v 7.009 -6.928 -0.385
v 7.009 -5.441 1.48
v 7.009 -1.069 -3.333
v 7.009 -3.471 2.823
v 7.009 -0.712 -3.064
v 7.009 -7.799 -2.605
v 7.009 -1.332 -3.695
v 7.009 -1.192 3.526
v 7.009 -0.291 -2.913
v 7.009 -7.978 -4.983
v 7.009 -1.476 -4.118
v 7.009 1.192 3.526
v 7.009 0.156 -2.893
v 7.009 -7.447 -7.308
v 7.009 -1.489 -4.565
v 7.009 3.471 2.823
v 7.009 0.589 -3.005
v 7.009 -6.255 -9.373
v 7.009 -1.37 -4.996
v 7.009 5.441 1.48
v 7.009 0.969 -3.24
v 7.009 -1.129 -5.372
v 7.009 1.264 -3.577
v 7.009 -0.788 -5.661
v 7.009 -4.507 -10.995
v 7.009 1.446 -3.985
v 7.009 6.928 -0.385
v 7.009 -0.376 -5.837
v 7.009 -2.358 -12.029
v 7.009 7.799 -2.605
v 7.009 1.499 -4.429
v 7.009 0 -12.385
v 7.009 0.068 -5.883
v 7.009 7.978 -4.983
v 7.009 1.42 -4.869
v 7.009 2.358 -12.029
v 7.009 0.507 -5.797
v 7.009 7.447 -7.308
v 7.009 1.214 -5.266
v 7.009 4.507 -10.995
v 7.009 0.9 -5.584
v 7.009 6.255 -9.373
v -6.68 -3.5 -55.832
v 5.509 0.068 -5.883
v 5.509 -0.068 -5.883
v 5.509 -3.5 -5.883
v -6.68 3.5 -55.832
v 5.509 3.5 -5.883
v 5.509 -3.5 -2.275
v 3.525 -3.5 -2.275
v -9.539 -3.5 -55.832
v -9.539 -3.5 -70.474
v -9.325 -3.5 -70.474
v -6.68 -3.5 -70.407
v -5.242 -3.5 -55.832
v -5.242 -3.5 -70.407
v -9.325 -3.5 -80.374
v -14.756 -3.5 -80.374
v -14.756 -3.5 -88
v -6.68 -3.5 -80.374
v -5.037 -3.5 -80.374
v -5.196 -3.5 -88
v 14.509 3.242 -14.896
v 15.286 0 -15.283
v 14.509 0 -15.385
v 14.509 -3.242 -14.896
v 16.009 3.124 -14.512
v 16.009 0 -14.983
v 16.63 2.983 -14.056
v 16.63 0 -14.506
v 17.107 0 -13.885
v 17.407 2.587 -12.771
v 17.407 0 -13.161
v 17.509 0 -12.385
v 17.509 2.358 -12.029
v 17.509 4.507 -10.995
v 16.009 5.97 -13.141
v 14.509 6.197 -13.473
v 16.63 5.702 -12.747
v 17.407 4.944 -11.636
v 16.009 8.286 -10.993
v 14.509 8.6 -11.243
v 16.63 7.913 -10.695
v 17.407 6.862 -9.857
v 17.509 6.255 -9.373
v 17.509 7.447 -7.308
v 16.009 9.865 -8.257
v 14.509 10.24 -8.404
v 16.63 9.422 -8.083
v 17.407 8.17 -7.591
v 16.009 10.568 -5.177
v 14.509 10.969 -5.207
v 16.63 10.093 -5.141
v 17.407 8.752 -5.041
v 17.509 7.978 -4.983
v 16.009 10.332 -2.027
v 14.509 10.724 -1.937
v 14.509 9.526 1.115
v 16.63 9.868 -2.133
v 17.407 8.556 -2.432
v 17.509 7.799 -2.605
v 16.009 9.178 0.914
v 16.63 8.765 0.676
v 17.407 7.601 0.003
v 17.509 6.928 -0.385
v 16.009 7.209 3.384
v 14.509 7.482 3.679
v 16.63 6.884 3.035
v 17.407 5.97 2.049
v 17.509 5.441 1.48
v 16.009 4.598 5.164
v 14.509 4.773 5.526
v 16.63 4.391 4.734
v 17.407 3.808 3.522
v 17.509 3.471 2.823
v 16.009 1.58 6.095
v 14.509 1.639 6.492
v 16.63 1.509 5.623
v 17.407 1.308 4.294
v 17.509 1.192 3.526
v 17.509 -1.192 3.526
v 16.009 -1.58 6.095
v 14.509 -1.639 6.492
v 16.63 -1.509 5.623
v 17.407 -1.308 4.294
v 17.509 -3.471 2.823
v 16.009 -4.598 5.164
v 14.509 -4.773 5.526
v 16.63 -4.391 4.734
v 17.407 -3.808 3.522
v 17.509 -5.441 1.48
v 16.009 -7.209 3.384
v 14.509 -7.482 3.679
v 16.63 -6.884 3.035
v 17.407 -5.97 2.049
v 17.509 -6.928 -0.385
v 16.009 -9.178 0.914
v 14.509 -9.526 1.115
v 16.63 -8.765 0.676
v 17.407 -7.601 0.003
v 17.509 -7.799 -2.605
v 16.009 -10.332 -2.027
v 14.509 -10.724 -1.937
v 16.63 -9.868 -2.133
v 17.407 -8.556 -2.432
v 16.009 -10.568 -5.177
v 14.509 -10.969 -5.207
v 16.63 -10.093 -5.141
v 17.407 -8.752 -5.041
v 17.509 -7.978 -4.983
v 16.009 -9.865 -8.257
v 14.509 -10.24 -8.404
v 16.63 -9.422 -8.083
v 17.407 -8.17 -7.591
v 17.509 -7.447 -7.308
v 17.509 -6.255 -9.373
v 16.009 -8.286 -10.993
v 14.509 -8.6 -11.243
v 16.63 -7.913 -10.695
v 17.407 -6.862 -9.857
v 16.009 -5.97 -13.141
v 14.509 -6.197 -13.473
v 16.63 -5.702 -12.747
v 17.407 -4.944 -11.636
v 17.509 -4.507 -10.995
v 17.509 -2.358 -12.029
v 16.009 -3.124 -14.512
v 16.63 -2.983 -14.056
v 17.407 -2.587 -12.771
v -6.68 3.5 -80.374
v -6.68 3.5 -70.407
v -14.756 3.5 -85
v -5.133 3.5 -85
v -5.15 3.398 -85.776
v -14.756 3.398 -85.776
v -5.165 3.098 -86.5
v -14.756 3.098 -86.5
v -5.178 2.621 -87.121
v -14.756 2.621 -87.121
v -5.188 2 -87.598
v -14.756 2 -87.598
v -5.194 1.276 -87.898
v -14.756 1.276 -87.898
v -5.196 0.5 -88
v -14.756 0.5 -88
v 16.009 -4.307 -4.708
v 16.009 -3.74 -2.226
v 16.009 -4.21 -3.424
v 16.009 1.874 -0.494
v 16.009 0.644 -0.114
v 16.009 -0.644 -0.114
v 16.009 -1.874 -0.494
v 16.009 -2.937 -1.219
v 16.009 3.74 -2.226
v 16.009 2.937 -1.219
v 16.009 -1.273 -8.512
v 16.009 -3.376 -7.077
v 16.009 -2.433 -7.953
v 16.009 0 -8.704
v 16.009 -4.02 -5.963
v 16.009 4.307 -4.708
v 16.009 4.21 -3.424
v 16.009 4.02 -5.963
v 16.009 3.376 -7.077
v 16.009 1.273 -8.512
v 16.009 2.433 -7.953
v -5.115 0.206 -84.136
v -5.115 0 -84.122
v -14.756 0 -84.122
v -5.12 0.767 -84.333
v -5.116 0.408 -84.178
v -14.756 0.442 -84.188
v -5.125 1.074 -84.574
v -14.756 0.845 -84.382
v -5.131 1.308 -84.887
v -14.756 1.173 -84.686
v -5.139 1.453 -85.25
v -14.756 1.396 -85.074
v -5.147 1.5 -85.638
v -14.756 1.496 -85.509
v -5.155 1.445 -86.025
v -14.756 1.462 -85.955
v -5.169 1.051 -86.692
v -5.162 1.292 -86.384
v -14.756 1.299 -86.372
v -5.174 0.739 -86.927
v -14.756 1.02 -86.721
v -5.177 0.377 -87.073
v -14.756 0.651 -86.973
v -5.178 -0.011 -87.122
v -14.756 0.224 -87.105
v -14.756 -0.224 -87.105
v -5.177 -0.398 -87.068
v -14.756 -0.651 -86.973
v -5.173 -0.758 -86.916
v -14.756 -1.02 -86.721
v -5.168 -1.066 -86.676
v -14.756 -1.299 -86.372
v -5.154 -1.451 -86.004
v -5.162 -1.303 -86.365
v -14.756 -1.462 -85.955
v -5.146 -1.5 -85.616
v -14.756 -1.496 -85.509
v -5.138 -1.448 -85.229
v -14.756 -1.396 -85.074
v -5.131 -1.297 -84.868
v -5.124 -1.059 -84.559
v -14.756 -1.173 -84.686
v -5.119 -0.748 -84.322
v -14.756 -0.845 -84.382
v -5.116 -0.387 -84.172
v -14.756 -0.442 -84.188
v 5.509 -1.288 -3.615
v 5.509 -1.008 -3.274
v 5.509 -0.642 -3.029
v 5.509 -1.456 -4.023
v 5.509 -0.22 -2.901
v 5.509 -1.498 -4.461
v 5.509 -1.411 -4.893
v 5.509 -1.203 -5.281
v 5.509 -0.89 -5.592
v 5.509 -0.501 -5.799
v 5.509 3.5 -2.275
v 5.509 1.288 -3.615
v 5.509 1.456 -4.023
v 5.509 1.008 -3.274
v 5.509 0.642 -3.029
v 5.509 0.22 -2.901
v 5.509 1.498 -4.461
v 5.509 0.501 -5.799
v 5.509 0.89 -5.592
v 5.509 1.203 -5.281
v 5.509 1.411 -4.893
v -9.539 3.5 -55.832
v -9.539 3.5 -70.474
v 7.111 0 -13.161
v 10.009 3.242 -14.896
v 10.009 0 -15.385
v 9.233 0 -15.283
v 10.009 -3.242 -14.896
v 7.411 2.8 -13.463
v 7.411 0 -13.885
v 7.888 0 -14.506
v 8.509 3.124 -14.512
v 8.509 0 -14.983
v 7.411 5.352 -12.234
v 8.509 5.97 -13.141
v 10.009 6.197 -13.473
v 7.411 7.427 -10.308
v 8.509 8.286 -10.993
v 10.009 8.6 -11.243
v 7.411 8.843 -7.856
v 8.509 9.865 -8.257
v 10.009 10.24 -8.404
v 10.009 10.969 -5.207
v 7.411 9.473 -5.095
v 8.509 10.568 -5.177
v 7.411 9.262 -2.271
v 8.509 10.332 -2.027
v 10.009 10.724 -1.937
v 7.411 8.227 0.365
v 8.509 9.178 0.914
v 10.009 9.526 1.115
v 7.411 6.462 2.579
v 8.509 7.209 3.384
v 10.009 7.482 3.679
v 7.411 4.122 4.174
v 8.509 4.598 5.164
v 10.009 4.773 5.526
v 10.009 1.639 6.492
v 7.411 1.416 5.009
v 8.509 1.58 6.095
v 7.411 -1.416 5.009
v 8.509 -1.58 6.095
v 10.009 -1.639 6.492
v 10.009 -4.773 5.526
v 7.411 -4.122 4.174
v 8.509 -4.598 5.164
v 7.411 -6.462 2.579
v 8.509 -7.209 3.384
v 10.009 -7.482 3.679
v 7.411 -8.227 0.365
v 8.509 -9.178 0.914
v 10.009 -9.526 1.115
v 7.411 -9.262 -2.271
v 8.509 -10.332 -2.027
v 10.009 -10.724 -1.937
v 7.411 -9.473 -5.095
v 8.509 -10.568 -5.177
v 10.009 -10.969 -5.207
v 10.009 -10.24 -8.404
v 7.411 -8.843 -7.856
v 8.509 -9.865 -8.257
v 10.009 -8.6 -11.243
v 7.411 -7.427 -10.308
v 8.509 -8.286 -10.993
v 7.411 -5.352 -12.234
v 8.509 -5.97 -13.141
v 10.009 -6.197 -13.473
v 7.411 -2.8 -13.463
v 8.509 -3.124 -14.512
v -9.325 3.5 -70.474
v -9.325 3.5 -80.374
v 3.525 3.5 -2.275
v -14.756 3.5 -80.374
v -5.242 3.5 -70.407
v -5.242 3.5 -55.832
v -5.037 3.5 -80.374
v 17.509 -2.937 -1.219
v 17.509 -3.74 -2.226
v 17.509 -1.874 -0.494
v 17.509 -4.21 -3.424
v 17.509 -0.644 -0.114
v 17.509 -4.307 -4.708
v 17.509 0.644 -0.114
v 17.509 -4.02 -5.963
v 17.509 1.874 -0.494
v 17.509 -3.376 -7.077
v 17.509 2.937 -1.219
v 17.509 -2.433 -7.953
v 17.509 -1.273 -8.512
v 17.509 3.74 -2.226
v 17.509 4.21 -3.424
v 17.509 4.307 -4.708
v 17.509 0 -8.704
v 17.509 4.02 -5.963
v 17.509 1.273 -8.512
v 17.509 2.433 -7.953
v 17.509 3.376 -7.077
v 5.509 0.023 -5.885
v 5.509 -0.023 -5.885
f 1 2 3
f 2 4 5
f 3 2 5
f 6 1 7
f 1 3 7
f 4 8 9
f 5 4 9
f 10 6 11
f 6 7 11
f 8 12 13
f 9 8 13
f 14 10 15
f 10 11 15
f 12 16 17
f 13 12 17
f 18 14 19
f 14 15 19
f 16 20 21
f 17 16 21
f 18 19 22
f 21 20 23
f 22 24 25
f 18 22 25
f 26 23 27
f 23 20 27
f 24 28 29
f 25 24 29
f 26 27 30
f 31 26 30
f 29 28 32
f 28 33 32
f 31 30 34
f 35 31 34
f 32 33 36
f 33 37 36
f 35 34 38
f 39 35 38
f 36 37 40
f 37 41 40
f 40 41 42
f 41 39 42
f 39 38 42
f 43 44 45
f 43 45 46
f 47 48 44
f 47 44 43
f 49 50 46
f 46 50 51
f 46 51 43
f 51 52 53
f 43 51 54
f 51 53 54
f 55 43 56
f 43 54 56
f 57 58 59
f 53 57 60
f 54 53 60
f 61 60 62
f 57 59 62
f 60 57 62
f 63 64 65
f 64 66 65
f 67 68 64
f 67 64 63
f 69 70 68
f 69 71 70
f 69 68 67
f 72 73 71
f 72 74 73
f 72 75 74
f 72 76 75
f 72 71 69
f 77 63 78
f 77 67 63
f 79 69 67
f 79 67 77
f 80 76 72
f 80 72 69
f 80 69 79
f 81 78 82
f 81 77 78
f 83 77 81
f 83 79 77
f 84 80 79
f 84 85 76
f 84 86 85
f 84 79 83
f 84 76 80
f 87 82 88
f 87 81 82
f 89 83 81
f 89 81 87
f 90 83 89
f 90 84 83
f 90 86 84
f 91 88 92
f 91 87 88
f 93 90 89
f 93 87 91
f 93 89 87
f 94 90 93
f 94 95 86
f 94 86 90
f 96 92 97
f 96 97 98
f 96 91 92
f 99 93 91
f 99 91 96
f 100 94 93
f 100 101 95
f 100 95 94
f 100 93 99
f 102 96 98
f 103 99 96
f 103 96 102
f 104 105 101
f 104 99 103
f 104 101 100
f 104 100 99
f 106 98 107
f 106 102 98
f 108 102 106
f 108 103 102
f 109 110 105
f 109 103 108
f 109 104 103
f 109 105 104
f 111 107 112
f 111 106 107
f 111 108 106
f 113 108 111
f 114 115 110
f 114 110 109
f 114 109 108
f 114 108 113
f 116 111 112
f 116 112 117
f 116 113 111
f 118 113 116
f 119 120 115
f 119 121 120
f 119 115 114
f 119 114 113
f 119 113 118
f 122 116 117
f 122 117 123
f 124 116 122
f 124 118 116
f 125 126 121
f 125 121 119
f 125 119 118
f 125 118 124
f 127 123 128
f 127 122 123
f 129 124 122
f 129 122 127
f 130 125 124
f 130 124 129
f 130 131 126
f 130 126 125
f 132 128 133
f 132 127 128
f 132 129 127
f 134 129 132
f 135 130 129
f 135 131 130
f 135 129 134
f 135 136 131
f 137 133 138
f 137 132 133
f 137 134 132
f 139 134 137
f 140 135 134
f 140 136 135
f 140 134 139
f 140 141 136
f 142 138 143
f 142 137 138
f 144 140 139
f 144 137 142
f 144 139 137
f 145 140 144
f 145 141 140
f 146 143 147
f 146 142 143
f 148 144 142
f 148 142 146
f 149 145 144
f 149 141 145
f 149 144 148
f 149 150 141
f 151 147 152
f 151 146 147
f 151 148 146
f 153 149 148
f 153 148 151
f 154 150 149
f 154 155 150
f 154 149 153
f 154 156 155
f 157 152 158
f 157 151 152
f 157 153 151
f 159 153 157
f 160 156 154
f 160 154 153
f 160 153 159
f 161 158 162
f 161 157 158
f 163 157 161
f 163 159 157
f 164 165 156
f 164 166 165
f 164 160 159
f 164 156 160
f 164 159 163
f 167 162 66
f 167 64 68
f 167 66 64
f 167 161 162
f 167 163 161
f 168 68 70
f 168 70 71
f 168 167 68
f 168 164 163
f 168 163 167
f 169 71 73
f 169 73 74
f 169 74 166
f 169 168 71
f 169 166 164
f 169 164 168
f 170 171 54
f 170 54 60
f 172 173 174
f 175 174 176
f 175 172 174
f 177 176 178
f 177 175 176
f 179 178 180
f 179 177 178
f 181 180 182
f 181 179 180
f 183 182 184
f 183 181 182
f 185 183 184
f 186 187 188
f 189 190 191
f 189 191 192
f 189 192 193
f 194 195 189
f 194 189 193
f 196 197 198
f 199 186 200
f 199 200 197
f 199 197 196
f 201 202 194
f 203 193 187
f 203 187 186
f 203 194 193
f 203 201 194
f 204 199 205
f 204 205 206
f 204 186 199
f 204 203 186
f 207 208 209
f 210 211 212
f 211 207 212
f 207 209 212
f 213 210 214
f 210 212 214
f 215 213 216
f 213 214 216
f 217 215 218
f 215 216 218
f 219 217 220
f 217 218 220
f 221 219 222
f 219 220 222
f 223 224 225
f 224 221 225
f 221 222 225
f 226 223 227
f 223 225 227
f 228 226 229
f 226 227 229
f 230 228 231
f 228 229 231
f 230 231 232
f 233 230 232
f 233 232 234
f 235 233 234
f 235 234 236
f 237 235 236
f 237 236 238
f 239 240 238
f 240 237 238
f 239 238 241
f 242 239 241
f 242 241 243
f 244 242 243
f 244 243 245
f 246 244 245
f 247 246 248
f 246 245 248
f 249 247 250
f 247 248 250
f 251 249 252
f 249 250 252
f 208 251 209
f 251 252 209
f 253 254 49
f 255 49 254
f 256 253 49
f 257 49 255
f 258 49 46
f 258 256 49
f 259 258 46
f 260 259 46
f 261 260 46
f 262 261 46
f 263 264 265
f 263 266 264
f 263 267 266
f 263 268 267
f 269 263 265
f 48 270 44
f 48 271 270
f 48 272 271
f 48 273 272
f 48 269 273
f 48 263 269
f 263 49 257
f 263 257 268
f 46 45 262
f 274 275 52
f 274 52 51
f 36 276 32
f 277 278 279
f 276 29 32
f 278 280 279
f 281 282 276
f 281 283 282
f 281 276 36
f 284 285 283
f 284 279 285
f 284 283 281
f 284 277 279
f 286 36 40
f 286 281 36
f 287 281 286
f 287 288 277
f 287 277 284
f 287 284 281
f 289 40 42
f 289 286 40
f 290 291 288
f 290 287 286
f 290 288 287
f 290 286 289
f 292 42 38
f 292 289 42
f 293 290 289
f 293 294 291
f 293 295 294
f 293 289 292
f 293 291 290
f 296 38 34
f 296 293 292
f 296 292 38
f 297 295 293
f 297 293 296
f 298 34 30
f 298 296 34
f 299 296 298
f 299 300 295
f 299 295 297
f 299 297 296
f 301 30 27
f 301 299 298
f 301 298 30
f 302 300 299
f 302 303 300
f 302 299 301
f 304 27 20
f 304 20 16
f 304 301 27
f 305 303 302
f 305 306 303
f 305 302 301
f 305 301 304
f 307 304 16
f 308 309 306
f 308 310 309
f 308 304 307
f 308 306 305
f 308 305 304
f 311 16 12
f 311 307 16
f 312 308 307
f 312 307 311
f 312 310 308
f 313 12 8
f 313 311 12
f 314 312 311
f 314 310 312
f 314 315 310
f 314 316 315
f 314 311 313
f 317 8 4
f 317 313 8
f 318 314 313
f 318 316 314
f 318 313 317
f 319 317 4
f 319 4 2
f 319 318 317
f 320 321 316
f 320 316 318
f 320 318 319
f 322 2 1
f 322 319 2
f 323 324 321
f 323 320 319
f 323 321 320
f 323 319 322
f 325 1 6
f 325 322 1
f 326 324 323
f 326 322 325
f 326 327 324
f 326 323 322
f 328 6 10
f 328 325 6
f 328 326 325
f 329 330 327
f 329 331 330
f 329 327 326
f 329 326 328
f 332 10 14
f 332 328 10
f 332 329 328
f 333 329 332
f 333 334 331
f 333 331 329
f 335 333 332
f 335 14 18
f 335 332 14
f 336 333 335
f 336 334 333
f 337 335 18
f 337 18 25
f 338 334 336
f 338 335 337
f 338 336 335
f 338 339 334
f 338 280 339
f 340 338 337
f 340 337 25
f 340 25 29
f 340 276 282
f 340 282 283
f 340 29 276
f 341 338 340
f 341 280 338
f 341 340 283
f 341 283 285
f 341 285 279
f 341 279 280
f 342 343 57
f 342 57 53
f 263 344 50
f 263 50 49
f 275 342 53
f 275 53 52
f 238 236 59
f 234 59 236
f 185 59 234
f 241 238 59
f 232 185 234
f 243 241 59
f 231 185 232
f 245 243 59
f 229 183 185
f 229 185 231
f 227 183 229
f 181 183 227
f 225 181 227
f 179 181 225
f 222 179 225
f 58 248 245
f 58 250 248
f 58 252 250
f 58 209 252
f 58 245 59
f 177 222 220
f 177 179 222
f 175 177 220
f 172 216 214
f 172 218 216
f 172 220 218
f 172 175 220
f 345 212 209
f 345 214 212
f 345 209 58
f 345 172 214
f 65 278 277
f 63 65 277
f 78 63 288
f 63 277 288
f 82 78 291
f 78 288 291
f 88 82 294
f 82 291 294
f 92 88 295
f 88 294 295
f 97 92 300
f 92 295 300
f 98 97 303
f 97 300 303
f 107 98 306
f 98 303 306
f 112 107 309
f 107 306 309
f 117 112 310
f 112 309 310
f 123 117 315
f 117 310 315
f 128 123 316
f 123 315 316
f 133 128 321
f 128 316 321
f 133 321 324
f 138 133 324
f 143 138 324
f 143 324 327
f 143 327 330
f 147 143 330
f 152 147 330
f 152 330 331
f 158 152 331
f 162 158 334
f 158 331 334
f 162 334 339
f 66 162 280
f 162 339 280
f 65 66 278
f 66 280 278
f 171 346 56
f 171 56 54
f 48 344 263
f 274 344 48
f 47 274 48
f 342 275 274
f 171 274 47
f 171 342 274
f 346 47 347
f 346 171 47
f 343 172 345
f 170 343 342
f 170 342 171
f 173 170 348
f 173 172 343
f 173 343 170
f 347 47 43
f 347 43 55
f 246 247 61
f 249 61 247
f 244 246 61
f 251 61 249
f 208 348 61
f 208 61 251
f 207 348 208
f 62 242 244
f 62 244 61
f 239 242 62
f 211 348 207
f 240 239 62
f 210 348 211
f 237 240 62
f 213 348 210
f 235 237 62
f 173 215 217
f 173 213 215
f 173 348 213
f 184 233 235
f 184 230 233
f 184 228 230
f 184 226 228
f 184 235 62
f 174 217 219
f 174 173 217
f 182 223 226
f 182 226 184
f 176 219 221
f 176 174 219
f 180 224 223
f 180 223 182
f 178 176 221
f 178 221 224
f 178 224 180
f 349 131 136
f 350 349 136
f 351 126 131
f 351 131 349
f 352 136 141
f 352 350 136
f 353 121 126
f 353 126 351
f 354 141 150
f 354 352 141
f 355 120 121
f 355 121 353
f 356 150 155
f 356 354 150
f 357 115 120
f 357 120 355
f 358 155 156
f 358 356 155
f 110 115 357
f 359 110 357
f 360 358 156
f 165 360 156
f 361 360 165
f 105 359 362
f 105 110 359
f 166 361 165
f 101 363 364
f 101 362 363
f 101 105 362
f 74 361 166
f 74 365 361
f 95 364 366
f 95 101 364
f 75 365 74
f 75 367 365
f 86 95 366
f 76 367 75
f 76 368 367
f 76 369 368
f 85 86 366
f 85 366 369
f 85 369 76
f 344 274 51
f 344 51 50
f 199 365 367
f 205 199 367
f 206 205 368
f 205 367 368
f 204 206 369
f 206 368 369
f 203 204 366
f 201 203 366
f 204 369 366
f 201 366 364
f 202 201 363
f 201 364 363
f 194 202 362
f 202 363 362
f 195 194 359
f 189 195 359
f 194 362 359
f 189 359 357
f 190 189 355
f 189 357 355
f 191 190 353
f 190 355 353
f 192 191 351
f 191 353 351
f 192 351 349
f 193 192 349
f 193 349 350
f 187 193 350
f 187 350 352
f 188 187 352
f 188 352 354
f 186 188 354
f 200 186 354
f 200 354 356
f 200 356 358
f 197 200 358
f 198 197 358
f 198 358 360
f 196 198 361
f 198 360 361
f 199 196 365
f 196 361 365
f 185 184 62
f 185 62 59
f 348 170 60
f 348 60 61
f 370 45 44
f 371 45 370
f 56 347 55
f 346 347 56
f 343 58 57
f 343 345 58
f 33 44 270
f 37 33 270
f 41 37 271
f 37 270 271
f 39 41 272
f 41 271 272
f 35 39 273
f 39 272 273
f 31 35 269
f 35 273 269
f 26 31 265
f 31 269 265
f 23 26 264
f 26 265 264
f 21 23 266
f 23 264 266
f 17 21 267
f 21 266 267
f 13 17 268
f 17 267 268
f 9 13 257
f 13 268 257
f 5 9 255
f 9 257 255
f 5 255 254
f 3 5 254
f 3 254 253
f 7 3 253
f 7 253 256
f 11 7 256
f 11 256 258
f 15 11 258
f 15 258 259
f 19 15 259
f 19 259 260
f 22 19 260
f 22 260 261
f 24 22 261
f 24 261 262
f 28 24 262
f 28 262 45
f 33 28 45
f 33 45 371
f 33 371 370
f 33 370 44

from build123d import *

# Parameters (mm, degrees)
BOSS_EXTRUDE1_DEPTH = 3.5
SKETCH2_R           = 1.5
CUT_EXTRUDE1_DEPTH  = 27
SKETCH8_R           = 1.5
BOSS_EXTRUDE6_DEPTH = 1.5
SKETCH9_R           = 11
BOSS_EXTRUDE7_DEPTH = 10.5
FILLET11_R          = 3
FILLET12_R          = 3
SKETCH12_R          = 4.31867217
CUT_EXTRUDE2_DEPTH  = 1.5


with BuildPart() as part:
    # Sketch1 → Boss-Extrude1 (new, symmetric)
    with BuildSketch(Plane(origin=(0, 0, 0), x_dir=(1, 0, 0), z_dir=(0, 1, 0))):
        Polygon((-14.755737993, 80.374354469), (-9.325152651, 80.374354469), (-9.325152651, 70.474186712), (-9.539422483, 70.474186712), (-9.539422483, 55.832207765), (3.525320524, 2.274676859), (5.509138823, 2.274676859), (5.509138823, 5.883287993), (-6.679961691, 55.832207765), (-5.241843463, 55.832207765), (-5.241843463, 70.40730195), (-6.679961691, 70.40730195), (-6.679961691, 72.014475303), (-6.679961691, 80.374354469), (-5.036944489, 80.374354469), (-5.196098726, 88), (-14.755737993, 88), align=None)
    extrude(amount=BOSS_EXTRUDE1_DEPTH, both=True)

    # Sketch2 → Cut-Extrude1 (cut)
    with BuildSketch(Plane.ZY.offset(14.755737993)):
        with Locations((-85.621539819, 0)):
            Circle(SKETCH2_R)
    extrude(amount=-CUT_EXTRUDE1_DEPTH, mode=Mode.SUBTRACT)

    # Sketch8 → Boss-Extrude6 (add)
    with BuildSketch(Plane(origin=(5.509138823, 0, 0), x_dir=(0, 0, -1), z_dir=(1, 0, 0))):
        with Locations(Location((4.384839861, 0, 0), (0, 0, 2.606494438))):
            Circle(SKETCH8_R)
    extrude(amount=BOSS_EXTRUDE6_DEPTH)

    # Sketch9 → Boss-Extrude7 (add)
    with BuildSketch(Plane(origin=(7.009138823, 0, 0), x_dir=(0, 0, -1), z_dir=(1, 0, 0))):
        with Locations((4.384839861, 0)):
            Circle(SKETCH9_R)
    extrude(amount=BOSS_EXTRUDE7_DEPTH)

    # Fillet11
    fillet11_edges = [part.edges().sort_by_distance(p)[0] for p in [
        (-9.97591836, 3.5, -88),
    ]]
    fillet(fillet11_edges, radius=FILLET11_R)

    # Fillet12
    fillet12_edges = [part.edges().sort_by_distance(p)[0] for p in [
        (7.009138823, 0, 6.615160139),
        (17.509138823, 0, 6.615160139),
    ]]
    fillet(fillet12_edges, radius=FILLET12_R)

    # Sketch12 → Cut-Extrude2 (cut)
    with BuildSketch(Plane(origin=(17.509138823, 0, 0), x_dir=(0, 0, -1), z_dir=(1, 0, 0))):
        with Locations((4.384839861, 0)):
            Circle(SKETCH12_R)
    extrude(amount=-CUT_EXTRUDE2_DEPTH, mode=Mode.SUBTRACT)


solid = part.part
